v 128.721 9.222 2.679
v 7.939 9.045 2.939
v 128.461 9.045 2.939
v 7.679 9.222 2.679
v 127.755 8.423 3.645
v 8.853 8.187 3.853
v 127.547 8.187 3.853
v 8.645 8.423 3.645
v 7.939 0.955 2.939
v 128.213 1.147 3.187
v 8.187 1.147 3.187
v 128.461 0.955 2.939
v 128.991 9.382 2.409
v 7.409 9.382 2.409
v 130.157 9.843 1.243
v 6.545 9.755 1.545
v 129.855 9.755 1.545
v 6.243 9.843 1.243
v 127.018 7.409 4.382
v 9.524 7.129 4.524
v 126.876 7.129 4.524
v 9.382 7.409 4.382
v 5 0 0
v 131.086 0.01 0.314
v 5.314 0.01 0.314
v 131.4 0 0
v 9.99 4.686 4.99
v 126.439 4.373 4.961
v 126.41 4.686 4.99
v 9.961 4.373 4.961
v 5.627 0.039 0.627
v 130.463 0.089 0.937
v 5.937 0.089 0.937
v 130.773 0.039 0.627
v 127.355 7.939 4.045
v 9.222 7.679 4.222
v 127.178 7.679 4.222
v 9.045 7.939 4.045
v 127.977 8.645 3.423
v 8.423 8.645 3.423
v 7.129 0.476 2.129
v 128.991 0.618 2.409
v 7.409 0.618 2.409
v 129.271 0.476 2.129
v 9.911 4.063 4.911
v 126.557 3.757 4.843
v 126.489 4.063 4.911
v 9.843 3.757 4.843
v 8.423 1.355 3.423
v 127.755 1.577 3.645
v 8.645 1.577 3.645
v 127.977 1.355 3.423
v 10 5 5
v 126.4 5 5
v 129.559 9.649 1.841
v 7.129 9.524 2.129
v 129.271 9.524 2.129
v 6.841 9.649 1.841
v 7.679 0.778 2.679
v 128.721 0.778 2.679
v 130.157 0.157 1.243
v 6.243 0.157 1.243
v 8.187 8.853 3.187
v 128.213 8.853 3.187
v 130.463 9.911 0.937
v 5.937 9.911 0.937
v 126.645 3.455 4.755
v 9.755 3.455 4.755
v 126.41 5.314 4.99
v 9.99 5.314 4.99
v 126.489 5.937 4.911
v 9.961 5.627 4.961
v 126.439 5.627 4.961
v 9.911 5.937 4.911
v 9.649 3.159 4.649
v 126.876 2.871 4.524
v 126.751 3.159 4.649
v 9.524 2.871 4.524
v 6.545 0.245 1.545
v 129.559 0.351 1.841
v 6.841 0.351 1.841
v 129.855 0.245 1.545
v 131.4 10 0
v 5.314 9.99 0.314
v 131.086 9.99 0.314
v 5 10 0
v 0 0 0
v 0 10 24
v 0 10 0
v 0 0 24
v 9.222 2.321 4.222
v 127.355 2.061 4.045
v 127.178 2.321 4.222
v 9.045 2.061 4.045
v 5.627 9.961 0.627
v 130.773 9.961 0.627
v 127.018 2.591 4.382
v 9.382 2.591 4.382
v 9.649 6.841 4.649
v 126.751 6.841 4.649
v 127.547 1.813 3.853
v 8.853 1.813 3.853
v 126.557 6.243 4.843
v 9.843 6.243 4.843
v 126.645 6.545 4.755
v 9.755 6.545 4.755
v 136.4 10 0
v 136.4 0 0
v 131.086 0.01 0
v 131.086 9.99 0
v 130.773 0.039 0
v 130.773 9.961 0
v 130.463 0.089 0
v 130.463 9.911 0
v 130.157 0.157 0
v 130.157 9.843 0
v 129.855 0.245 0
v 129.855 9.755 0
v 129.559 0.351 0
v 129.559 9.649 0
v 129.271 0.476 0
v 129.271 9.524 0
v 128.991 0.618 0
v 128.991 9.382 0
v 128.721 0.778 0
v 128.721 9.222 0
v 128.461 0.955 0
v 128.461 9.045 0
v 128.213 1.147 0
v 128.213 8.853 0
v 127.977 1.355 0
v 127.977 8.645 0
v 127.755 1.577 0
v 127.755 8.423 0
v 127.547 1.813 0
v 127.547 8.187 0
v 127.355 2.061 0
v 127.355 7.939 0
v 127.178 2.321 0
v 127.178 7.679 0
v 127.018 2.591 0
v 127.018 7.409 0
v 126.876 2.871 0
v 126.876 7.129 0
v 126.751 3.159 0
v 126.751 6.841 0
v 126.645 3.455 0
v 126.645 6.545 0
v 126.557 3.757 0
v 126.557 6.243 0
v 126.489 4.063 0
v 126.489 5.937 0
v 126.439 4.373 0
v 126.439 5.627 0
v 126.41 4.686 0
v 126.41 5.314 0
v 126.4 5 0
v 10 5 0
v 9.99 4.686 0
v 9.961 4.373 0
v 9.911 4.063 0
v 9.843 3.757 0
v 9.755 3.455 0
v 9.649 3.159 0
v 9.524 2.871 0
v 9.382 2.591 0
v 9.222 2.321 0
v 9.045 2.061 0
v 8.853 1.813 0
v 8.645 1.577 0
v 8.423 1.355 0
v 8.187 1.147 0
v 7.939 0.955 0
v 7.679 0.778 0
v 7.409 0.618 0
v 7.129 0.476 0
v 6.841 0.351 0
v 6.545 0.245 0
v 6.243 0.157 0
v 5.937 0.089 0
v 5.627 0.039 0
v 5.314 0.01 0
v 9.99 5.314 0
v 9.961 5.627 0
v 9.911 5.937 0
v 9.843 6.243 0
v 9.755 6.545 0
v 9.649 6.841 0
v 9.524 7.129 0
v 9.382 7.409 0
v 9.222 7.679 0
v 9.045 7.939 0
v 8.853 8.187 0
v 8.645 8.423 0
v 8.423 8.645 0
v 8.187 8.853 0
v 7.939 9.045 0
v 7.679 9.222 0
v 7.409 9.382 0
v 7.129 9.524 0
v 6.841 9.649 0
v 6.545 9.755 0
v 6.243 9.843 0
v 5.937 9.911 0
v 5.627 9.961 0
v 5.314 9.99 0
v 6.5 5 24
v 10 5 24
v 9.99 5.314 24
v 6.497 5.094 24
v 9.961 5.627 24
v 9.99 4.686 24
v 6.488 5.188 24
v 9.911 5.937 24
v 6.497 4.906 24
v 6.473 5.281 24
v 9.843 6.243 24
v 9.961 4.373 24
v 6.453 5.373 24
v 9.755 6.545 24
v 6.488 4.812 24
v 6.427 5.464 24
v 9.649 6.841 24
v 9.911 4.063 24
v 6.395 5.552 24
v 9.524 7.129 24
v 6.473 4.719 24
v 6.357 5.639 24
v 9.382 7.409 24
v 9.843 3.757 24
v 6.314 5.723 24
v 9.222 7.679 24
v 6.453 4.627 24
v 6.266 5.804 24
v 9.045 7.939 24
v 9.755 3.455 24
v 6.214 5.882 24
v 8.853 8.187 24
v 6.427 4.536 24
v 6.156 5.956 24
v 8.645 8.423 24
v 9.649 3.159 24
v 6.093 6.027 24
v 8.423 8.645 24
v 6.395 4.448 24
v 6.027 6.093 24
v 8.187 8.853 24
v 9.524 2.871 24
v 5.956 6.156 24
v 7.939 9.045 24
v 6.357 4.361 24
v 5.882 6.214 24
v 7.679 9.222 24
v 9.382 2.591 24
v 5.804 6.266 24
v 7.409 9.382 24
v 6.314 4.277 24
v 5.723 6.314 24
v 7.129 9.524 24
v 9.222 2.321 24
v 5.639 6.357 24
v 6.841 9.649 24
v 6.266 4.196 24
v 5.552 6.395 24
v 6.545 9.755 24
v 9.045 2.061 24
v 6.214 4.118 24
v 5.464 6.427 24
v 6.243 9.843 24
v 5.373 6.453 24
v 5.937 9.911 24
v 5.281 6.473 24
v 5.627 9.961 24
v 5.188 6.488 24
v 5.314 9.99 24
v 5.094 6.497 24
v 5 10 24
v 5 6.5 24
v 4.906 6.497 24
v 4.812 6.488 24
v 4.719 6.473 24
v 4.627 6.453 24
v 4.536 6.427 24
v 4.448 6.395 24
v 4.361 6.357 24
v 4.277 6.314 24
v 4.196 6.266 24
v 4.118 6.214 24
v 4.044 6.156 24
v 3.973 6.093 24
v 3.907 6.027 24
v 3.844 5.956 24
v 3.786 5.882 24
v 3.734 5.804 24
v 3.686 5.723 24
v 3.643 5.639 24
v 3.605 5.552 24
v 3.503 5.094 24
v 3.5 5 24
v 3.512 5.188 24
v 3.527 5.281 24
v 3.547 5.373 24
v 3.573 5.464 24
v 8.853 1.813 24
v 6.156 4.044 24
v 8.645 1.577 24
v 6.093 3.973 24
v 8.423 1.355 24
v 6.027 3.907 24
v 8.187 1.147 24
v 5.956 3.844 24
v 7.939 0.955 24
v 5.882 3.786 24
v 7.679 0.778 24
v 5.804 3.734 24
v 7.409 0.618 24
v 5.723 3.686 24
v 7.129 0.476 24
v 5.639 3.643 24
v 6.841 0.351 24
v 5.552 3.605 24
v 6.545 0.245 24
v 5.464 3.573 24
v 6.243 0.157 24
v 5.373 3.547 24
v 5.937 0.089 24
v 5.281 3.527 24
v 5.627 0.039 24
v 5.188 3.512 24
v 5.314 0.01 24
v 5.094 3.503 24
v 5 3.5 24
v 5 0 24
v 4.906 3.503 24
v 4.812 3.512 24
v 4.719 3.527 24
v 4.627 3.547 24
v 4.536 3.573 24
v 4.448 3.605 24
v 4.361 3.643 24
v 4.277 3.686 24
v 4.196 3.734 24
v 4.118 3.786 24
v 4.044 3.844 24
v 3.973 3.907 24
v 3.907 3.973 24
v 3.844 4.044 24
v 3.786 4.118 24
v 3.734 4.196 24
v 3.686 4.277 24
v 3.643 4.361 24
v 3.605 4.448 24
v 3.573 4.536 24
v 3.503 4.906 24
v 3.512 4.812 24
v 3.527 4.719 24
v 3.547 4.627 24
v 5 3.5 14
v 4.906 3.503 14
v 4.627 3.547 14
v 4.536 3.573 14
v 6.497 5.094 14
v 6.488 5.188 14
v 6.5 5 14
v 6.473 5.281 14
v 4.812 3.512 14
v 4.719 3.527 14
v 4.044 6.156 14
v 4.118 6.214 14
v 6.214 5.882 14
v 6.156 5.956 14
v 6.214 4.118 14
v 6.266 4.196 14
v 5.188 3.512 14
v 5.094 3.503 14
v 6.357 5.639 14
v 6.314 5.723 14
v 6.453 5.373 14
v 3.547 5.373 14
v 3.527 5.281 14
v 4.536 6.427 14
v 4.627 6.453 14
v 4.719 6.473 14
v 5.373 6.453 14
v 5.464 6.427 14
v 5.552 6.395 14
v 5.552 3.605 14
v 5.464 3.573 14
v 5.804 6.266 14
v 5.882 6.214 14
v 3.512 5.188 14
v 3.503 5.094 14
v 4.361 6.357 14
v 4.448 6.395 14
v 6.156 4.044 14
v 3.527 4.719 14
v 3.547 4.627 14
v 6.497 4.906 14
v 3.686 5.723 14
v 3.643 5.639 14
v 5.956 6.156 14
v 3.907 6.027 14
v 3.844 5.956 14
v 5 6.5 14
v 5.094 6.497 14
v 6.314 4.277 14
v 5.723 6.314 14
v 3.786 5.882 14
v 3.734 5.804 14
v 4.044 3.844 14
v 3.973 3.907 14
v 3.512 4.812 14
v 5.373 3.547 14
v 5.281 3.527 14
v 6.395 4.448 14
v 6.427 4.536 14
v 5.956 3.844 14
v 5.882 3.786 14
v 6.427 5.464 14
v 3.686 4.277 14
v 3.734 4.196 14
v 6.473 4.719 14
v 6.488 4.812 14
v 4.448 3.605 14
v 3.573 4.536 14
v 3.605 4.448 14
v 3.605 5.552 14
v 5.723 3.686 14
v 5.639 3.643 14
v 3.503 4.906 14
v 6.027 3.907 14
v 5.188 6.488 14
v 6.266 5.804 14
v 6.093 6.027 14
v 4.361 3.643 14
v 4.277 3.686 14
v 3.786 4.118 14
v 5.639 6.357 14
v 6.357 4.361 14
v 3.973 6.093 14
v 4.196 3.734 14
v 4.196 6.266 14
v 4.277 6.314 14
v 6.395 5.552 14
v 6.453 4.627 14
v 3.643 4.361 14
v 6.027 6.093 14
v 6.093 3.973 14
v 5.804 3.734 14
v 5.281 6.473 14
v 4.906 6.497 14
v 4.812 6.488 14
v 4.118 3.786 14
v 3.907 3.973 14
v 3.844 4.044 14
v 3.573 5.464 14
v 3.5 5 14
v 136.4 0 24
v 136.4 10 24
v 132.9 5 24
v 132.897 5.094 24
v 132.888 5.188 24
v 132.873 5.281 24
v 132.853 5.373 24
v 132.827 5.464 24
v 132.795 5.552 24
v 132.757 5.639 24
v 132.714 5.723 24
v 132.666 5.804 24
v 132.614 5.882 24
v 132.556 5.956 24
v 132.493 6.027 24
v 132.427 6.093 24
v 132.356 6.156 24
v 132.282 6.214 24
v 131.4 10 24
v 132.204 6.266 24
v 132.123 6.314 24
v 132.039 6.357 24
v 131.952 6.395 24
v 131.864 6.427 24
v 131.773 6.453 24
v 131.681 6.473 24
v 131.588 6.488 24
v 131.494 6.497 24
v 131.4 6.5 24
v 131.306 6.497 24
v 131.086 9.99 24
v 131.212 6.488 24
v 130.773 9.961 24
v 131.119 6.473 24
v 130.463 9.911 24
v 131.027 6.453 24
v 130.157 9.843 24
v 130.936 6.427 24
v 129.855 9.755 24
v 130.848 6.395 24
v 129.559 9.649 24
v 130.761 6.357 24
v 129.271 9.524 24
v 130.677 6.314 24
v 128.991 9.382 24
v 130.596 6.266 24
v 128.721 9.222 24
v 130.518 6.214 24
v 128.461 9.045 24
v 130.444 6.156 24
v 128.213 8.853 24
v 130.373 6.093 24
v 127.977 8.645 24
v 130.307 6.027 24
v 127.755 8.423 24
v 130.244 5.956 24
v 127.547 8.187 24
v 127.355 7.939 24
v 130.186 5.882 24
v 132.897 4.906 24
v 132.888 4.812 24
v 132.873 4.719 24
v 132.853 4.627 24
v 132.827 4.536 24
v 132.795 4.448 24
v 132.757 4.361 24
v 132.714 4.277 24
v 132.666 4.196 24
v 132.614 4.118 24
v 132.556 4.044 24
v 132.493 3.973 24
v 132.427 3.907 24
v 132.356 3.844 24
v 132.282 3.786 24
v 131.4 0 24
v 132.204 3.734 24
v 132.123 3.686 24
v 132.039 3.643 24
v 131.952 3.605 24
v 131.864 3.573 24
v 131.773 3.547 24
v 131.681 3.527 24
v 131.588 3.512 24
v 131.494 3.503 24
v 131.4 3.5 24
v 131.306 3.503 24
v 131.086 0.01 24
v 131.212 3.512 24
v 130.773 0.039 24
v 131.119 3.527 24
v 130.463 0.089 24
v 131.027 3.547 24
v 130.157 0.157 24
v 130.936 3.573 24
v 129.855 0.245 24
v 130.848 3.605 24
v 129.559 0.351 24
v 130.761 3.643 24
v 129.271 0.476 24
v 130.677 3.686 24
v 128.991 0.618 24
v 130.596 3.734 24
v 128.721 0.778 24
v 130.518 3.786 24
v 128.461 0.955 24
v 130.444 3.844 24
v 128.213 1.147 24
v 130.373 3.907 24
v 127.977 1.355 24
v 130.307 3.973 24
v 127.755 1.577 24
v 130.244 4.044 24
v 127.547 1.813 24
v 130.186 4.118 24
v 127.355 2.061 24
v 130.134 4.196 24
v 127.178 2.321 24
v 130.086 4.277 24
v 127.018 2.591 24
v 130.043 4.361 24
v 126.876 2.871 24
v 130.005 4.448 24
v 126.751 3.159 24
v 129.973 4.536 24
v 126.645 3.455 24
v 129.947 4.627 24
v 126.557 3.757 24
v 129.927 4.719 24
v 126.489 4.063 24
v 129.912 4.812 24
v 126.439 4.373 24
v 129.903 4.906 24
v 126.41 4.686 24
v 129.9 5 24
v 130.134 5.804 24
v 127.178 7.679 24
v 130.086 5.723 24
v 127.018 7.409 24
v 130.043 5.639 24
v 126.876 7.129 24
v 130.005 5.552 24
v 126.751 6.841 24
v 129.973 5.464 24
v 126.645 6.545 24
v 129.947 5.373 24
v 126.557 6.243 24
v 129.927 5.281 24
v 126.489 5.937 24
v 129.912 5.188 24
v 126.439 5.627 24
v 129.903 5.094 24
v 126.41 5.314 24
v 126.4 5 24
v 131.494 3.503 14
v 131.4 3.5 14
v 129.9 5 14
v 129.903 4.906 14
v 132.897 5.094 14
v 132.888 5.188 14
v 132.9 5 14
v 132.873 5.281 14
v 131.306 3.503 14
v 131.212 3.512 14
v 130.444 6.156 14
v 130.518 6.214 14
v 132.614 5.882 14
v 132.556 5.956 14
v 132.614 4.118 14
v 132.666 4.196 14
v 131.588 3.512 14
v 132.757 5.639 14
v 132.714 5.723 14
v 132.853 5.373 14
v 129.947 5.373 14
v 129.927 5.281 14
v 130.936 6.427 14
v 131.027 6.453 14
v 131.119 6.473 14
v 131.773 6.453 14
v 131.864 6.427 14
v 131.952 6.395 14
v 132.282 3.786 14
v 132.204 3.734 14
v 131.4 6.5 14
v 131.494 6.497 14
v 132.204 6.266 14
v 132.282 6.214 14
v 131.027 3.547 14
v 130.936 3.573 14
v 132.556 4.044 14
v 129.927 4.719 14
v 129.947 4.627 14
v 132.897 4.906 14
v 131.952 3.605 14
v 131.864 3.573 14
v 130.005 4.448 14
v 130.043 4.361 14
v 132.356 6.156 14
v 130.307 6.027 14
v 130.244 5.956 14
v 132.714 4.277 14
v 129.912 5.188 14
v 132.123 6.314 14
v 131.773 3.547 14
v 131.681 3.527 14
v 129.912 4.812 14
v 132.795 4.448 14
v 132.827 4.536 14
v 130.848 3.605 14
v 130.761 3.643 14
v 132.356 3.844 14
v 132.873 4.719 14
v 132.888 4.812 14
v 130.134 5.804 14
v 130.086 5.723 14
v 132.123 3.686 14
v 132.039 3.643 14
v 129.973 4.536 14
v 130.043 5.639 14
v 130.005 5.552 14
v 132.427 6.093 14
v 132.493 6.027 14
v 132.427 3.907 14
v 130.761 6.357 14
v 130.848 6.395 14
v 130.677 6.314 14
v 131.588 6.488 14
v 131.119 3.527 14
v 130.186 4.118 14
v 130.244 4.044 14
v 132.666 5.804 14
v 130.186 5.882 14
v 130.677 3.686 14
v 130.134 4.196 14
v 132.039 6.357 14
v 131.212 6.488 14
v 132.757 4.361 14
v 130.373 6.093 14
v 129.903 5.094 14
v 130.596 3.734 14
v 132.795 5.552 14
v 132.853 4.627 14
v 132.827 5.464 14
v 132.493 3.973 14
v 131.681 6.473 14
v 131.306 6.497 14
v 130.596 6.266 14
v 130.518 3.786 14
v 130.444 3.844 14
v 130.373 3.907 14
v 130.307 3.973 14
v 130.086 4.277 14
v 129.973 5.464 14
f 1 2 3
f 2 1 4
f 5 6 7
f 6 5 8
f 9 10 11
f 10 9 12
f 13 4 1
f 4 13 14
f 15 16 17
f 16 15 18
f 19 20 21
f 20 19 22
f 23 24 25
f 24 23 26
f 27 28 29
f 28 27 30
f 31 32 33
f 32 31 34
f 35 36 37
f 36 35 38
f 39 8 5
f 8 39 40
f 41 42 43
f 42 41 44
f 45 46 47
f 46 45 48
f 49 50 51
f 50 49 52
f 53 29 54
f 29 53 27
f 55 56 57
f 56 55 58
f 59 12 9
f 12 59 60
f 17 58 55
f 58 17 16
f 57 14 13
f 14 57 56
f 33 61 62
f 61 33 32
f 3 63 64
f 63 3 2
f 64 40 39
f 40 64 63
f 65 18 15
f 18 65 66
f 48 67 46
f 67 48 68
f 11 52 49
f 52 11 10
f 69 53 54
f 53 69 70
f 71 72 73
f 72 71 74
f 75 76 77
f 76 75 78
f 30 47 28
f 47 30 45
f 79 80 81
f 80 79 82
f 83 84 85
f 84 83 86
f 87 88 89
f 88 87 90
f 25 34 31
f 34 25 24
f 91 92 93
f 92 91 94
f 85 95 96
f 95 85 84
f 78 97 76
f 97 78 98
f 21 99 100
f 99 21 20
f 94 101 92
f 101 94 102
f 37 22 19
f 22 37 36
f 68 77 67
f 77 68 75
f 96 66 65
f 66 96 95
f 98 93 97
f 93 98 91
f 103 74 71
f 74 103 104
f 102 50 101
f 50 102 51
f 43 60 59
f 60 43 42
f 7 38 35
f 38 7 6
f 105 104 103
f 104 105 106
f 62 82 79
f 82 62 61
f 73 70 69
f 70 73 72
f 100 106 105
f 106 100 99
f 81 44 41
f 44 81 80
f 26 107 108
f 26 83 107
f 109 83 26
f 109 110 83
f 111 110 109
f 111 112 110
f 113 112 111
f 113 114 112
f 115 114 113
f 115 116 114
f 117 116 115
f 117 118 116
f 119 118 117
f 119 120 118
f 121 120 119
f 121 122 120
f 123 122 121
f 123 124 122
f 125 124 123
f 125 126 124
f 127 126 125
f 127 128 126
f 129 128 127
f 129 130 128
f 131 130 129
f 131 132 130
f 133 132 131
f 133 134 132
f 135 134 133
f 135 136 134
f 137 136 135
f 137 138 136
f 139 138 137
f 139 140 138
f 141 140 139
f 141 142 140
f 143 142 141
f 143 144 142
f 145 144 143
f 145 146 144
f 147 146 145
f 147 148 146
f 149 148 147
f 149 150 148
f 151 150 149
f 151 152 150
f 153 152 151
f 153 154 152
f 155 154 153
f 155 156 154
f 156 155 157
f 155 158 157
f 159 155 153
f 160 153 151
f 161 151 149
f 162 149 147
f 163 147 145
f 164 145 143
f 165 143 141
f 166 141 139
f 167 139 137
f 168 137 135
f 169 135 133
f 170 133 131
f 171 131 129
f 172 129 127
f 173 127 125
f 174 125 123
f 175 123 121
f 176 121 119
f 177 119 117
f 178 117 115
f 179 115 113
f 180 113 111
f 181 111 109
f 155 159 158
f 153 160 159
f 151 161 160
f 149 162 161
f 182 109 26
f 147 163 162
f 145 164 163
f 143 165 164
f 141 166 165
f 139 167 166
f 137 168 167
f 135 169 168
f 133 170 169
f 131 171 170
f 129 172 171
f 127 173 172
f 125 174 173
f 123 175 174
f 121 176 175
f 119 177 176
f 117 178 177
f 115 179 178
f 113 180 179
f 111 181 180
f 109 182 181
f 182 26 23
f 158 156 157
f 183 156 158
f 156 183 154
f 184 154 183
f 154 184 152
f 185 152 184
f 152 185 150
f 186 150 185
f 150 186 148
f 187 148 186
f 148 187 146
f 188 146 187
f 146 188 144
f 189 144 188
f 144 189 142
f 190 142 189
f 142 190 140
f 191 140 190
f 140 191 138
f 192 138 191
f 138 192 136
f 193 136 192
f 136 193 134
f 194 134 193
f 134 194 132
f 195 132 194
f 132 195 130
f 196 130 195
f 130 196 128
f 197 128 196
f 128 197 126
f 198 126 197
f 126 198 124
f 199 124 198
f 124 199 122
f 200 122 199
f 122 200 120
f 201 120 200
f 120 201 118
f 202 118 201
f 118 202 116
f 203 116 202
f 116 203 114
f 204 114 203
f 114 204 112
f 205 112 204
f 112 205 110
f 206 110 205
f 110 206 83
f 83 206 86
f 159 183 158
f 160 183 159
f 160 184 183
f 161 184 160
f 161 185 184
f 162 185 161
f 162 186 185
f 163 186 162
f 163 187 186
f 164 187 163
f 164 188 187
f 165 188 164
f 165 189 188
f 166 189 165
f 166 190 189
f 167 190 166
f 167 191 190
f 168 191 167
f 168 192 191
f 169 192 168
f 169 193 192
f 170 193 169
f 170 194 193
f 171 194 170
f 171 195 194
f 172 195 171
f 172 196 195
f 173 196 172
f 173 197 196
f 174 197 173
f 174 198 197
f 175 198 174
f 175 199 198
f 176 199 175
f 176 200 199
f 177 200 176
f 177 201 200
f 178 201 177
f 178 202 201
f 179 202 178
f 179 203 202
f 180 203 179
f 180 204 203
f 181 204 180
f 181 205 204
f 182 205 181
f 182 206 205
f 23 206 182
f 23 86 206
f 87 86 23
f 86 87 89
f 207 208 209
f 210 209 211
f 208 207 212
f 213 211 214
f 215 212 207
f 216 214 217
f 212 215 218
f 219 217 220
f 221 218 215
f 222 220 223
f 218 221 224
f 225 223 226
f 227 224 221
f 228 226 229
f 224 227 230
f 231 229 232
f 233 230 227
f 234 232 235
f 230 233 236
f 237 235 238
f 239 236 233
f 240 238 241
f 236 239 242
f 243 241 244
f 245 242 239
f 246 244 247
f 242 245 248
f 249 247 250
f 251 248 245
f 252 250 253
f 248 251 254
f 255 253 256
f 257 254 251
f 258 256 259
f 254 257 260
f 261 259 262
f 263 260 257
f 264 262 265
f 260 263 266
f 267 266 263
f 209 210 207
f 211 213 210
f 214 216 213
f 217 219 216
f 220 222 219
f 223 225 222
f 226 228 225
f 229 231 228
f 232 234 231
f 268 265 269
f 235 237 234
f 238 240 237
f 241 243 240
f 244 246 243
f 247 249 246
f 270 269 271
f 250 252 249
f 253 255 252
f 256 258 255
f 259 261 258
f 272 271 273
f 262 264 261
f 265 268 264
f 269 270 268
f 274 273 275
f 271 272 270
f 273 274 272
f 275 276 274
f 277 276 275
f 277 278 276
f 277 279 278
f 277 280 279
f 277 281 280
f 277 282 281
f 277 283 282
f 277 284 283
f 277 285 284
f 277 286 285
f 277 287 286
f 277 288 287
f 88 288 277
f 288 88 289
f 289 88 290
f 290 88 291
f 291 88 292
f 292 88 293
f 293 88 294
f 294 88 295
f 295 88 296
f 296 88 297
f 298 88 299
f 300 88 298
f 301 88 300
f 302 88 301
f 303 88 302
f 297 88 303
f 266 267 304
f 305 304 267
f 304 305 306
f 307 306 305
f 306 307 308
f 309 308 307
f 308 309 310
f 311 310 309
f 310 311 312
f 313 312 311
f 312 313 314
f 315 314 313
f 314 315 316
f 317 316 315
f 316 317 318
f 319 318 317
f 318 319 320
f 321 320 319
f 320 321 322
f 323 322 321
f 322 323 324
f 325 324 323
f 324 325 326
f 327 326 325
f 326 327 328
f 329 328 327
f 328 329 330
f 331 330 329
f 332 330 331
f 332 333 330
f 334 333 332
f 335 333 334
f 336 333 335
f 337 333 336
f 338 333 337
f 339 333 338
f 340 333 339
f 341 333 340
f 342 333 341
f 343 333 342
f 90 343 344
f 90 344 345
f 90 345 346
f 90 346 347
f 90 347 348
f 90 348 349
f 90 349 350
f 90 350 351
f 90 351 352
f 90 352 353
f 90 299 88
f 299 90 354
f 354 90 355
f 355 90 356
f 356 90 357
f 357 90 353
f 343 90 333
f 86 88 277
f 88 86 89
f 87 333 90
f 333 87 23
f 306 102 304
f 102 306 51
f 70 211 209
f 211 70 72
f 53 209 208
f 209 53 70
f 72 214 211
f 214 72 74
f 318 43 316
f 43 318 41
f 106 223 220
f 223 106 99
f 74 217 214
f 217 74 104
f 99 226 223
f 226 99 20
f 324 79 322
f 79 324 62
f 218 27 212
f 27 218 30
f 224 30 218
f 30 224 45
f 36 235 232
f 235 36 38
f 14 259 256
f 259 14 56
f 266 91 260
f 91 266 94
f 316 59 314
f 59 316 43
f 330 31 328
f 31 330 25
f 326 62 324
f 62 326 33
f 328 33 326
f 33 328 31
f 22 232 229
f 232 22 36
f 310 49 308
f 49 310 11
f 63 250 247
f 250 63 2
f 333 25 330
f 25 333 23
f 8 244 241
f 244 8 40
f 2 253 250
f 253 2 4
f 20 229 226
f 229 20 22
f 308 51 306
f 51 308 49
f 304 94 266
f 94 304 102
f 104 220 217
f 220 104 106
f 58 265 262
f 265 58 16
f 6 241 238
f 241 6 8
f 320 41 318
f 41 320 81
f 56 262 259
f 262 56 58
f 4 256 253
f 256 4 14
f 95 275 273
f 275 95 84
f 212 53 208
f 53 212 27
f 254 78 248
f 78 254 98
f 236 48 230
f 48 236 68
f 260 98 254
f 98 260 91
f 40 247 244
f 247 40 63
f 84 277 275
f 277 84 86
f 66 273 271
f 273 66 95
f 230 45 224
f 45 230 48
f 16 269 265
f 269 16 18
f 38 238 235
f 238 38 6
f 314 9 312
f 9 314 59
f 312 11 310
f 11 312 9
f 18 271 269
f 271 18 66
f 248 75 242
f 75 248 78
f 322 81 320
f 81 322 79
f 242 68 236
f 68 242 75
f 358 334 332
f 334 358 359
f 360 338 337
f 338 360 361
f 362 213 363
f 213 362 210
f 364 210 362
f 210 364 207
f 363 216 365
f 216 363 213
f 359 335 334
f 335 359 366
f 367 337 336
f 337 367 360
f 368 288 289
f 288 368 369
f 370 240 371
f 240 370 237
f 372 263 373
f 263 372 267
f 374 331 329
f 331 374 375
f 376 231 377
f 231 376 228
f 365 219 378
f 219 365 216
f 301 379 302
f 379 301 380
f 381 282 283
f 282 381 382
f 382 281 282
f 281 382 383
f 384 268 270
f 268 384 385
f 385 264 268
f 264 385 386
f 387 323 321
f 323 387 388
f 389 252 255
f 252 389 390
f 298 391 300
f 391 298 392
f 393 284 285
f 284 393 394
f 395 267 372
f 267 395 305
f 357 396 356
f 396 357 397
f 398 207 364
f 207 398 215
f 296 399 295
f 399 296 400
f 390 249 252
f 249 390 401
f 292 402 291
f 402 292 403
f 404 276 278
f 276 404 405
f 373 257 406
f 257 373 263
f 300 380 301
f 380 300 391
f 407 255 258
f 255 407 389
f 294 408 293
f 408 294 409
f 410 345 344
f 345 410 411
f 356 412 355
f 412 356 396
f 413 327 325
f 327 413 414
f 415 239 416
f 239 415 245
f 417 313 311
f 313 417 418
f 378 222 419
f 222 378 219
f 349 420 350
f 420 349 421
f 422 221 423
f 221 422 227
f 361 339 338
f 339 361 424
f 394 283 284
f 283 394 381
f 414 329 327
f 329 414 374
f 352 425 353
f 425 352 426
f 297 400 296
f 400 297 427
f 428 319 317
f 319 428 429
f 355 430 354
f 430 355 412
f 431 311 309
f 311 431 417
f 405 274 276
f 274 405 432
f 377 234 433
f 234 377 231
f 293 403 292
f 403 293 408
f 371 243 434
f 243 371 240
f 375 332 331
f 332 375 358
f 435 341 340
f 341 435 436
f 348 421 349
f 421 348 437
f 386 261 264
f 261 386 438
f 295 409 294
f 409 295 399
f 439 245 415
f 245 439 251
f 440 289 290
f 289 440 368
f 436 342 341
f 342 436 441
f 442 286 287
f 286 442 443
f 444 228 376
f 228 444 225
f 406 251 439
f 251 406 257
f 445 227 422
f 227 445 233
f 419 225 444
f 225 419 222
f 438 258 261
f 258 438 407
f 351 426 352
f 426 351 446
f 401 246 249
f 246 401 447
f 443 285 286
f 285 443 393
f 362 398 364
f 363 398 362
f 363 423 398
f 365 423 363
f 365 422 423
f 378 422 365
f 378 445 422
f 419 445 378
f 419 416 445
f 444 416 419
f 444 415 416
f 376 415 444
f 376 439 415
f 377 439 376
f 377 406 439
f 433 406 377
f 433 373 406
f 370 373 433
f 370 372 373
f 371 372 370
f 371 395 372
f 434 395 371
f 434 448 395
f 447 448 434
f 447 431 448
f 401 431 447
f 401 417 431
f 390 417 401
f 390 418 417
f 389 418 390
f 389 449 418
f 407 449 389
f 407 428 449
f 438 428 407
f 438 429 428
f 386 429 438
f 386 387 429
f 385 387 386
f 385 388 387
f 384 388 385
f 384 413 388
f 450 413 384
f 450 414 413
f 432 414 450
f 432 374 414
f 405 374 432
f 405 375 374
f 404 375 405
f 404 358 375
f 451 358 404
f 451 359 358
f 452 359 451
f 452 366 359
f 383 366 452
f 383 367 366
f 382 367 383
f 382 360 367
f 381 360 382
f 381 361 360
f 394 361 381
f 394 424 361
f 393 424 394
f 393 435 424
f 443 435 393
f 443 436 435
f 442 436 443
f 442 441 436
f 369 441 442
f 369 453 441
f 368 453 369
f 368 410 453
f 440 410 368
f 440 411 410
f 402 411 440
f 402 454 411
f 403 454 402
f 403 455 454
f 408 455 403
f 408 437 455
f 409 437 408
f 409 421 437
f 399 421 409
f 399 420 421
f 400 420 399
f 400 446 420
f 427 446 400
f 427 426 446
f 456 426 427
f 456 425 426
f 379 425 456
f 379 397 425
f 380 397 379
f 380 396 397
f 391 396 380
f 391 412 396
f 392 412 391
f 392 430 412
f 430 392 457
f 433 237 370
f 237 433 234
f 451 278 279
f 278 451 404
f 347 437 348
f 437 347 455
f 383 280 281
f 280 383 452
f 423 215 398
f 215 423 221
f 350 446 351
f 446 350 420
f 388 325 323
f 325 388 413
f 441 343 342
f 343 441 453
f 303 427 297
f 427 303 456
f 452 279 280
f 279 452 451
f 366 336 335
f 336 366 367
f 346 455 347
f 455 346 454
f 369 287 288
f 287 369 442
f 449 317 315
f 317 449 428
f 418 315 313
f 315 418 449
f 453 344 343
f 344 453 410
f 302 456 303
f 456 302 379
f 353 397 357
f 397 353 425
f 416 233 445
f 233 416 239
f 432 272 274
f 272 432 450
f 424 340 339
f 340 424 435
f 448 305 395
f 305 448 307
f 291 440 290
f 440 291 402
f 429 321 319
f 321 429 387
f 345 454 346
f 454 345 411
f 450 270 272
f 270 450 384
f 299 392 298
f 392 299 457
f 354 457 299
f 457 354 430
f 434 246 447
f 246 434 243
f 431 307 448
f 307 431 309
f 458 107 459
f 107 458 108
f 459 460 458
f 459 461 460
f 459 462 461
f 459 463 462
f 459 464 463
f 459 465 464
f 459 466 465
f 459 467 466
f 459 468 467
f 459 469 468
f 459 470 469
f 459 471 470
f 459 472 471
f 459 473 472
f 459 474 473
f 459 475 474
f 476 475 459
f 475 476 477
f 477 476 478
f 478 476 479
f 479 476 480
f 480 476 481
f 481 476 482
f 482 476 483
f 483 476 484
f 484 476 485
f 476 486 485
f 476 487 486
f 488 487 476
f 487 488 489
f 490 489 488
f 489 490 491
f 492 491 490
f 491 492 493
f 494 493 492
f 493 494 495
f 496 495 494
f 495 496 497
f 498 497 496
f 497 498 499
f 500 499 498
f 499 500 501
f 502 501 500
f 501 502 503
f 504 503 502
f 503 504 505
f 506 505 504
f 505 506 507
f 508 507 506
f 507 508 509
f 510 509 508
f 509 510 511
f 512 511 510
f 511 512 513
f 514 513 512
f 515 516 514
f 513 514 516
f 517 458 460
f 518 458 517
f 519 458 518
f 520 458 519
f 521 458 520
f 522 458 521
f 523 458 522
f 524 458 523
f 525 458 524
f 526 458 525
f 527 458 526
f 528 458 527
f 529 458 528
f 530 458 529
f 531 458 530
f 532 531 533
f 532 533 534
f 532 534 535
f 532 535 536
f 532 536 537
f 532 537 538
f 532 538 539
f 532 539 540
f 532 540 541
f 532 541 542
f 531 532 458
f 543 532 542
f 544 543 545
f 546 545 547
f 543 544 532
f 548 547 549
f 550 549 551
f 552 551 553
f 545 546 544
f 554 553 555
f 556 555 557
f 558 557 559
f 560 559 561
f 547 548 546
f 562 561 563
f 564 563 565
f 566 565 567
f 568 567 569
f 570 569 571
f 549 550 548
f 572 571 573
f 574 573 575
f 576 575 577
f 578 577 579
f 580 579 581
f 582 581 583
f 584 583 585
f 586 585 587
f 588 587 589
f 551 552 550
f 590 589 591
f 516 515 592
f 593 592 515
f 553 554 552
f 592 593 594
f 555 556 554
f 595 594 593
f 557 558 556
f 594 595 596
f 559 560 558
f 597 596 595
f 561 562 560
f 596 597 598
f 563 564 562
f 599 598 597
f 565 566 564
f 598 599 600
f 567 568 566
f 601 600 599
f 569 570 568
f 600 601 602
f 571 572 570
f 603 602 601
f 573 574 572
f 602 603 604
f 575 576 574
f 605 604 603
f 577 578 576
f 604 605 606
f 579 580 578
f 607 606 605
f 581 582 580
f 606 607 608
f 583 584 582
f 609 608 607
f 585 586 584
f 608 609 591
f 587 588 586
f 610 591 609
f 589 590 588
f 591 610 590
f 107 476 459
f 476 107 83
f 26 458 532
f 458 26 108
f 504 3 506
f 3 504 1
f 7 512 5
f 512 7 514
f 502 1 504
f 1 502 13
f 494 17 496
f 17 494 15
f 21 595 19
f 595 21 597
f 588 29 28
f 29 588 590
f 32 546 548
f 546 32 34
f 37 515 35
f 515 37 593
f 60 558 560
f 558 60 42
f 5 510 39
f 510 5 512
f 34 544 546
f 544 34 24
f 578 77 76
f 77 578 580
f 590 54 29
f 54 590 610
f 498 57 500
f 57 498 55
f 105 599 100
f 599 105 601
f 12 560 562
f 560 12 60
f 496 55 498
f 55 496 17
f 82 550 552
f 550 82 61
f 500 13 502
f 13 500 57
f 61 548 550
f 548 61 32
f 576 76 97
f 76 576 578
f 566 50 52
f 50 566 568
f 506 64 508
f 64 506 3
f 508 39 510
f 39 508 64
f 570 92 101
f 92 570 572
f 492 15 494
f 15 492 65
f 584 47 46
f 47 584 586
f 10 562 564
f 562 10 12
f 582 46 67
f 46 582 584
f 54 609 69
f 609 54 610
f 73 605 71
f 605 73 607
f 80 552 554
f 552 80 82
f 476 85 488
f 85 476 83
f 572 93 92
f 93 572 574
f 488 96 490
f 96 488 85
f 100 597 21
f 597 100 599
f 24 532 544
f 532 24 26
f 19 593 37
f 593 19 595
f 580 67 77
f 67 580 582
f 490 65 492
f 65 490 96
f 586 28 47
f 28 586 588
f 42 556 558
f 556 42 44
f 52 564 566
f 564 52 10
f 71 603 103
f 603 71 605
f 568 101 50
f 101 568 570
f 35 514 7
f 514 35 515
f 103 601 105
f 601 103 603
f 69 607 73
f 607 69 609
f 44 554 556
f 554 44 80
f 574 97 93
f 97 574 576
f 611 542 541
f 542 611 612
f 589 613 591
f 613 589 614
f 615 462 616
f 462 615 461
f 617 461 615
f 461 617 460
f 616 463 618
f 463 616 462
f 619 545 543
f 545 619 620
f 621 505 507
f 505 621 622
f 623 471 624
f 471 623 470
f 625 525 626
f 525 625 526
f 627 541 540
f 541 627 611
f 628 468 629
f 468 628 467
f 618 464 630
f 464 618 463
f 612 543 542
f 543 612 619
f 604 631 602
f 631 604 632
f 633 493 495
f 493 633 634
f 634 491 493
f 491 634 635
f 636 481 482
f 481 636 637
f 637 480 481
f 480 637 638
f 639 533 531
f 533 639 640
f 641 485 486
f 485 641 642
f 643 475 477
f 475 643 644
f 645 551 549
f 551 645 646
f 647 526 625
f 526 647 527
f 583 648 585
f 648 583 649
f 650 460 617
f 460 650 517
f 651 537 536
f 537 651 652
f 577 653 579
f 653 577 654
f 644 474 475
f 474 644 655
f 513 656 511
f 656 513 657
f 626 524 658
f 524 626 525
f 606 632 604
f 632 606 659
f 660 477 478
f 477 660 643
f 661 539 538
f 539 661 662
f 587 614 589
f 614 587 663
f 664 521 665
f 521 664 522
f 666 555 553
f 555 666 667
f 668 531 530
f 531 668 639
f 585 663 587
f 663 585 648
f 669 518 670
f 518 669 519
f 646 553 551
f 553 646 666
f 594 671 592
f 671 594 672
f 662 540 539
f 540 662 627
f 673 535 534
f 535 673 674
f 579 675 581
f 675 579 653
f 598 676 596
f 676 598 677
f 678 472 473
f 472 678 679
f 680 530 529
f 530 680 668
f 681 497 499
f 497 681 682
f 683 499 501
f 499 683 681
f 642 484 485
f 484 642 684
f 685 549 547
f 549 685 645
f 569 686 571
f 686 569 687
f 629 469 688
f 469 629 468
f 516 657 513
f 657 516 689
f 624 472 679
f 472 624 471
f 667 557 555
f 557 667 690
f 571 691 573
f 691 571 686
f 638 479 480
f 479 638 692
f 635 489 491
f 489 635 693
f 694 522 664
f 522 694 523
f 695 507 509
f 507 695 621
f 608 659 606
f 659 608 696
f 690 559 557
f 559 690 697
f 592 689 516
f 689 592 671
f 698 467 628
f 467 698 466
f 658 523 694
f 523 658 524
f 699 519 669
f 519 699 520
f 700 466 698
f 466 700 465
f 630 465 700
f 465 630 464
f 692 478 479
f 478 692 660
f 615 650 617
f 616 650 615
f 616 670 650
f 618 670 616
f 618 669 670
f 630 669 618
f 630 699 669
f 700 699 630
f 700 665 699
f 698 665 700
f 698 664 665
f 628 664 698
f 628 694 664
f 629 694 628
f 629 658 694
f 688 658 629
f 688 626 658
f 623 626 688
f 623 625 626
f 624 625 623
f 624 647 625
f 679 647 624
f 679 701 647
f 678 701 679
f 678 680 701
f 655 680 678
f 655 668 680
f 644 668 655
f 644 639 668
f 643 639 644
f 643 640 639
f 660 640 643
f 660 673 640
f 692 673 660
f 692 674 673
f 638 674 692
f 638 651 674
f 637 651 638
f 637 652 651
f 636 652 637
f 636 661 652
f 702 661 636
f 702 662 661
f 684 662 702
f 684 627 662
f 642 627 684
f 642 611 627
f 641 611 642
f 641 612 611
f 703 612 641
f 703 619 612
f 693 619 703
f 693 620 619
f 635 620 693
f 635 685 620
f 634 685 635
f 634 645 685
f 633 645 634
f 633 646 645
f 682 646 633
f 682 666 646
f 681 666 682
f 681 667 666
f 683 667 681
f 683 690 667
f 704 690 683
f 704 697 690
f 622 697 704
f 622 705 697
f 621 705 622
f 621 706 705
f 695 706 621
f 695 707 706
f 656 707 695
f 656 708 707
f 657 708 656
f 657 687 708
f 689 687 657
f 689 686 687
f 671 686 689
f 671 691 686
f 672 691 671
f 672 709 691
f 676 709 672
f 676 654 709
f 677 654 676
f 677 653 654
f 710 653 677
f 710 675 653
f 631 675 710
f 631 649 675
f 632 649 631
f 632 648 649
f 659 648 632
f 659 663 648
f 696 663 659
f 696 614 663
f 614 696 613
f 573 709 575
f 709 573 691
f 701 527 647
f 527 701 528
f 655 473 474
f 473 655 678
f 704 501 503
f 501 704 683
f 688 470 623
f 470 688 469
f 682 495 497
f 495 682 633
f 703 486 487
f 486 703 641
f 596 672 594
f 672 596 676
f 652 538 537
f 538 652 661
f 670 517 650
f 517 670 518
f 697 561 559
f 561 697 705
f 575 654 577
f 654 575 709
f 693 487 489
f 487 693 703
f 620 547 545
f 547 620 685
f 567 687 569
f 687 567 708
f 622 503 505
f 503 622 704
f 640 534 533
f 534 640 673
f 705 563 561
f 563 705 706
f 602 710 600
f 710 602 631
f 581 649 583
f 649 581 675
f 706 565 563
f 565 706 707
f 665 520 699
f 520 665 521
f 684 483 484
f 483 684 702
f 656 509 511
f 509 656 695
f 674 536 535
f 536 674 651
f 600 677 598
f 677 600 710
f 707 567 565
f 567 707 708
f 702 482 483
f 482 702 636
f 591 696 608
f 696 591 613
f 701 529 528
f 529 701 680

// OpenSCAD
// IKEA DOMBÅS handle
// Author: Jonas Friedmann (@frdmn) <j@frd.mn>
// Licensed under MIT license

$fn = 100;

// Variables
SUPPORT_HEIGHT=24;
HANDLE_LENGTH=136.4;

// Function to draw handle base
module handle(){
    difference(){
        translate([0,5,0]){
            rotate(a=90, v=[0,1,0]){
                cylinder(h=HANDLE_LENGTH, r=5);  
            }
        }

        translate([0,0,-5]){
            cube([HANDLE_LENGTH,10,5]);
        }
    }
}

// Function to draw (regular or flipped) support pillars
module support(flipped){
    difference(){
        if (flipped){
            cube([5,10,SUPPORT_HEIGHT]);

            translate([5,5,0]){
                cylinder(h=SUPPORT_HEIGHT,r=5);
            }
        } else {
            cube([5,10,SUPPORT_HEIGHT]);

            translate([0,5,0]){
                cylinder(h=SUPPORT_HEIGHT,r=5);
            }
        }
        
        translate([flipped ? 5 : 0,5,SUPPORT_HEIGHT-10]){
                cylinder(h=10, d=3);
        }
    }
}

// Draw stuff
handle();
support(true);
translate([HANDLE_LENGTH-5,0,0]){
    support();
}
